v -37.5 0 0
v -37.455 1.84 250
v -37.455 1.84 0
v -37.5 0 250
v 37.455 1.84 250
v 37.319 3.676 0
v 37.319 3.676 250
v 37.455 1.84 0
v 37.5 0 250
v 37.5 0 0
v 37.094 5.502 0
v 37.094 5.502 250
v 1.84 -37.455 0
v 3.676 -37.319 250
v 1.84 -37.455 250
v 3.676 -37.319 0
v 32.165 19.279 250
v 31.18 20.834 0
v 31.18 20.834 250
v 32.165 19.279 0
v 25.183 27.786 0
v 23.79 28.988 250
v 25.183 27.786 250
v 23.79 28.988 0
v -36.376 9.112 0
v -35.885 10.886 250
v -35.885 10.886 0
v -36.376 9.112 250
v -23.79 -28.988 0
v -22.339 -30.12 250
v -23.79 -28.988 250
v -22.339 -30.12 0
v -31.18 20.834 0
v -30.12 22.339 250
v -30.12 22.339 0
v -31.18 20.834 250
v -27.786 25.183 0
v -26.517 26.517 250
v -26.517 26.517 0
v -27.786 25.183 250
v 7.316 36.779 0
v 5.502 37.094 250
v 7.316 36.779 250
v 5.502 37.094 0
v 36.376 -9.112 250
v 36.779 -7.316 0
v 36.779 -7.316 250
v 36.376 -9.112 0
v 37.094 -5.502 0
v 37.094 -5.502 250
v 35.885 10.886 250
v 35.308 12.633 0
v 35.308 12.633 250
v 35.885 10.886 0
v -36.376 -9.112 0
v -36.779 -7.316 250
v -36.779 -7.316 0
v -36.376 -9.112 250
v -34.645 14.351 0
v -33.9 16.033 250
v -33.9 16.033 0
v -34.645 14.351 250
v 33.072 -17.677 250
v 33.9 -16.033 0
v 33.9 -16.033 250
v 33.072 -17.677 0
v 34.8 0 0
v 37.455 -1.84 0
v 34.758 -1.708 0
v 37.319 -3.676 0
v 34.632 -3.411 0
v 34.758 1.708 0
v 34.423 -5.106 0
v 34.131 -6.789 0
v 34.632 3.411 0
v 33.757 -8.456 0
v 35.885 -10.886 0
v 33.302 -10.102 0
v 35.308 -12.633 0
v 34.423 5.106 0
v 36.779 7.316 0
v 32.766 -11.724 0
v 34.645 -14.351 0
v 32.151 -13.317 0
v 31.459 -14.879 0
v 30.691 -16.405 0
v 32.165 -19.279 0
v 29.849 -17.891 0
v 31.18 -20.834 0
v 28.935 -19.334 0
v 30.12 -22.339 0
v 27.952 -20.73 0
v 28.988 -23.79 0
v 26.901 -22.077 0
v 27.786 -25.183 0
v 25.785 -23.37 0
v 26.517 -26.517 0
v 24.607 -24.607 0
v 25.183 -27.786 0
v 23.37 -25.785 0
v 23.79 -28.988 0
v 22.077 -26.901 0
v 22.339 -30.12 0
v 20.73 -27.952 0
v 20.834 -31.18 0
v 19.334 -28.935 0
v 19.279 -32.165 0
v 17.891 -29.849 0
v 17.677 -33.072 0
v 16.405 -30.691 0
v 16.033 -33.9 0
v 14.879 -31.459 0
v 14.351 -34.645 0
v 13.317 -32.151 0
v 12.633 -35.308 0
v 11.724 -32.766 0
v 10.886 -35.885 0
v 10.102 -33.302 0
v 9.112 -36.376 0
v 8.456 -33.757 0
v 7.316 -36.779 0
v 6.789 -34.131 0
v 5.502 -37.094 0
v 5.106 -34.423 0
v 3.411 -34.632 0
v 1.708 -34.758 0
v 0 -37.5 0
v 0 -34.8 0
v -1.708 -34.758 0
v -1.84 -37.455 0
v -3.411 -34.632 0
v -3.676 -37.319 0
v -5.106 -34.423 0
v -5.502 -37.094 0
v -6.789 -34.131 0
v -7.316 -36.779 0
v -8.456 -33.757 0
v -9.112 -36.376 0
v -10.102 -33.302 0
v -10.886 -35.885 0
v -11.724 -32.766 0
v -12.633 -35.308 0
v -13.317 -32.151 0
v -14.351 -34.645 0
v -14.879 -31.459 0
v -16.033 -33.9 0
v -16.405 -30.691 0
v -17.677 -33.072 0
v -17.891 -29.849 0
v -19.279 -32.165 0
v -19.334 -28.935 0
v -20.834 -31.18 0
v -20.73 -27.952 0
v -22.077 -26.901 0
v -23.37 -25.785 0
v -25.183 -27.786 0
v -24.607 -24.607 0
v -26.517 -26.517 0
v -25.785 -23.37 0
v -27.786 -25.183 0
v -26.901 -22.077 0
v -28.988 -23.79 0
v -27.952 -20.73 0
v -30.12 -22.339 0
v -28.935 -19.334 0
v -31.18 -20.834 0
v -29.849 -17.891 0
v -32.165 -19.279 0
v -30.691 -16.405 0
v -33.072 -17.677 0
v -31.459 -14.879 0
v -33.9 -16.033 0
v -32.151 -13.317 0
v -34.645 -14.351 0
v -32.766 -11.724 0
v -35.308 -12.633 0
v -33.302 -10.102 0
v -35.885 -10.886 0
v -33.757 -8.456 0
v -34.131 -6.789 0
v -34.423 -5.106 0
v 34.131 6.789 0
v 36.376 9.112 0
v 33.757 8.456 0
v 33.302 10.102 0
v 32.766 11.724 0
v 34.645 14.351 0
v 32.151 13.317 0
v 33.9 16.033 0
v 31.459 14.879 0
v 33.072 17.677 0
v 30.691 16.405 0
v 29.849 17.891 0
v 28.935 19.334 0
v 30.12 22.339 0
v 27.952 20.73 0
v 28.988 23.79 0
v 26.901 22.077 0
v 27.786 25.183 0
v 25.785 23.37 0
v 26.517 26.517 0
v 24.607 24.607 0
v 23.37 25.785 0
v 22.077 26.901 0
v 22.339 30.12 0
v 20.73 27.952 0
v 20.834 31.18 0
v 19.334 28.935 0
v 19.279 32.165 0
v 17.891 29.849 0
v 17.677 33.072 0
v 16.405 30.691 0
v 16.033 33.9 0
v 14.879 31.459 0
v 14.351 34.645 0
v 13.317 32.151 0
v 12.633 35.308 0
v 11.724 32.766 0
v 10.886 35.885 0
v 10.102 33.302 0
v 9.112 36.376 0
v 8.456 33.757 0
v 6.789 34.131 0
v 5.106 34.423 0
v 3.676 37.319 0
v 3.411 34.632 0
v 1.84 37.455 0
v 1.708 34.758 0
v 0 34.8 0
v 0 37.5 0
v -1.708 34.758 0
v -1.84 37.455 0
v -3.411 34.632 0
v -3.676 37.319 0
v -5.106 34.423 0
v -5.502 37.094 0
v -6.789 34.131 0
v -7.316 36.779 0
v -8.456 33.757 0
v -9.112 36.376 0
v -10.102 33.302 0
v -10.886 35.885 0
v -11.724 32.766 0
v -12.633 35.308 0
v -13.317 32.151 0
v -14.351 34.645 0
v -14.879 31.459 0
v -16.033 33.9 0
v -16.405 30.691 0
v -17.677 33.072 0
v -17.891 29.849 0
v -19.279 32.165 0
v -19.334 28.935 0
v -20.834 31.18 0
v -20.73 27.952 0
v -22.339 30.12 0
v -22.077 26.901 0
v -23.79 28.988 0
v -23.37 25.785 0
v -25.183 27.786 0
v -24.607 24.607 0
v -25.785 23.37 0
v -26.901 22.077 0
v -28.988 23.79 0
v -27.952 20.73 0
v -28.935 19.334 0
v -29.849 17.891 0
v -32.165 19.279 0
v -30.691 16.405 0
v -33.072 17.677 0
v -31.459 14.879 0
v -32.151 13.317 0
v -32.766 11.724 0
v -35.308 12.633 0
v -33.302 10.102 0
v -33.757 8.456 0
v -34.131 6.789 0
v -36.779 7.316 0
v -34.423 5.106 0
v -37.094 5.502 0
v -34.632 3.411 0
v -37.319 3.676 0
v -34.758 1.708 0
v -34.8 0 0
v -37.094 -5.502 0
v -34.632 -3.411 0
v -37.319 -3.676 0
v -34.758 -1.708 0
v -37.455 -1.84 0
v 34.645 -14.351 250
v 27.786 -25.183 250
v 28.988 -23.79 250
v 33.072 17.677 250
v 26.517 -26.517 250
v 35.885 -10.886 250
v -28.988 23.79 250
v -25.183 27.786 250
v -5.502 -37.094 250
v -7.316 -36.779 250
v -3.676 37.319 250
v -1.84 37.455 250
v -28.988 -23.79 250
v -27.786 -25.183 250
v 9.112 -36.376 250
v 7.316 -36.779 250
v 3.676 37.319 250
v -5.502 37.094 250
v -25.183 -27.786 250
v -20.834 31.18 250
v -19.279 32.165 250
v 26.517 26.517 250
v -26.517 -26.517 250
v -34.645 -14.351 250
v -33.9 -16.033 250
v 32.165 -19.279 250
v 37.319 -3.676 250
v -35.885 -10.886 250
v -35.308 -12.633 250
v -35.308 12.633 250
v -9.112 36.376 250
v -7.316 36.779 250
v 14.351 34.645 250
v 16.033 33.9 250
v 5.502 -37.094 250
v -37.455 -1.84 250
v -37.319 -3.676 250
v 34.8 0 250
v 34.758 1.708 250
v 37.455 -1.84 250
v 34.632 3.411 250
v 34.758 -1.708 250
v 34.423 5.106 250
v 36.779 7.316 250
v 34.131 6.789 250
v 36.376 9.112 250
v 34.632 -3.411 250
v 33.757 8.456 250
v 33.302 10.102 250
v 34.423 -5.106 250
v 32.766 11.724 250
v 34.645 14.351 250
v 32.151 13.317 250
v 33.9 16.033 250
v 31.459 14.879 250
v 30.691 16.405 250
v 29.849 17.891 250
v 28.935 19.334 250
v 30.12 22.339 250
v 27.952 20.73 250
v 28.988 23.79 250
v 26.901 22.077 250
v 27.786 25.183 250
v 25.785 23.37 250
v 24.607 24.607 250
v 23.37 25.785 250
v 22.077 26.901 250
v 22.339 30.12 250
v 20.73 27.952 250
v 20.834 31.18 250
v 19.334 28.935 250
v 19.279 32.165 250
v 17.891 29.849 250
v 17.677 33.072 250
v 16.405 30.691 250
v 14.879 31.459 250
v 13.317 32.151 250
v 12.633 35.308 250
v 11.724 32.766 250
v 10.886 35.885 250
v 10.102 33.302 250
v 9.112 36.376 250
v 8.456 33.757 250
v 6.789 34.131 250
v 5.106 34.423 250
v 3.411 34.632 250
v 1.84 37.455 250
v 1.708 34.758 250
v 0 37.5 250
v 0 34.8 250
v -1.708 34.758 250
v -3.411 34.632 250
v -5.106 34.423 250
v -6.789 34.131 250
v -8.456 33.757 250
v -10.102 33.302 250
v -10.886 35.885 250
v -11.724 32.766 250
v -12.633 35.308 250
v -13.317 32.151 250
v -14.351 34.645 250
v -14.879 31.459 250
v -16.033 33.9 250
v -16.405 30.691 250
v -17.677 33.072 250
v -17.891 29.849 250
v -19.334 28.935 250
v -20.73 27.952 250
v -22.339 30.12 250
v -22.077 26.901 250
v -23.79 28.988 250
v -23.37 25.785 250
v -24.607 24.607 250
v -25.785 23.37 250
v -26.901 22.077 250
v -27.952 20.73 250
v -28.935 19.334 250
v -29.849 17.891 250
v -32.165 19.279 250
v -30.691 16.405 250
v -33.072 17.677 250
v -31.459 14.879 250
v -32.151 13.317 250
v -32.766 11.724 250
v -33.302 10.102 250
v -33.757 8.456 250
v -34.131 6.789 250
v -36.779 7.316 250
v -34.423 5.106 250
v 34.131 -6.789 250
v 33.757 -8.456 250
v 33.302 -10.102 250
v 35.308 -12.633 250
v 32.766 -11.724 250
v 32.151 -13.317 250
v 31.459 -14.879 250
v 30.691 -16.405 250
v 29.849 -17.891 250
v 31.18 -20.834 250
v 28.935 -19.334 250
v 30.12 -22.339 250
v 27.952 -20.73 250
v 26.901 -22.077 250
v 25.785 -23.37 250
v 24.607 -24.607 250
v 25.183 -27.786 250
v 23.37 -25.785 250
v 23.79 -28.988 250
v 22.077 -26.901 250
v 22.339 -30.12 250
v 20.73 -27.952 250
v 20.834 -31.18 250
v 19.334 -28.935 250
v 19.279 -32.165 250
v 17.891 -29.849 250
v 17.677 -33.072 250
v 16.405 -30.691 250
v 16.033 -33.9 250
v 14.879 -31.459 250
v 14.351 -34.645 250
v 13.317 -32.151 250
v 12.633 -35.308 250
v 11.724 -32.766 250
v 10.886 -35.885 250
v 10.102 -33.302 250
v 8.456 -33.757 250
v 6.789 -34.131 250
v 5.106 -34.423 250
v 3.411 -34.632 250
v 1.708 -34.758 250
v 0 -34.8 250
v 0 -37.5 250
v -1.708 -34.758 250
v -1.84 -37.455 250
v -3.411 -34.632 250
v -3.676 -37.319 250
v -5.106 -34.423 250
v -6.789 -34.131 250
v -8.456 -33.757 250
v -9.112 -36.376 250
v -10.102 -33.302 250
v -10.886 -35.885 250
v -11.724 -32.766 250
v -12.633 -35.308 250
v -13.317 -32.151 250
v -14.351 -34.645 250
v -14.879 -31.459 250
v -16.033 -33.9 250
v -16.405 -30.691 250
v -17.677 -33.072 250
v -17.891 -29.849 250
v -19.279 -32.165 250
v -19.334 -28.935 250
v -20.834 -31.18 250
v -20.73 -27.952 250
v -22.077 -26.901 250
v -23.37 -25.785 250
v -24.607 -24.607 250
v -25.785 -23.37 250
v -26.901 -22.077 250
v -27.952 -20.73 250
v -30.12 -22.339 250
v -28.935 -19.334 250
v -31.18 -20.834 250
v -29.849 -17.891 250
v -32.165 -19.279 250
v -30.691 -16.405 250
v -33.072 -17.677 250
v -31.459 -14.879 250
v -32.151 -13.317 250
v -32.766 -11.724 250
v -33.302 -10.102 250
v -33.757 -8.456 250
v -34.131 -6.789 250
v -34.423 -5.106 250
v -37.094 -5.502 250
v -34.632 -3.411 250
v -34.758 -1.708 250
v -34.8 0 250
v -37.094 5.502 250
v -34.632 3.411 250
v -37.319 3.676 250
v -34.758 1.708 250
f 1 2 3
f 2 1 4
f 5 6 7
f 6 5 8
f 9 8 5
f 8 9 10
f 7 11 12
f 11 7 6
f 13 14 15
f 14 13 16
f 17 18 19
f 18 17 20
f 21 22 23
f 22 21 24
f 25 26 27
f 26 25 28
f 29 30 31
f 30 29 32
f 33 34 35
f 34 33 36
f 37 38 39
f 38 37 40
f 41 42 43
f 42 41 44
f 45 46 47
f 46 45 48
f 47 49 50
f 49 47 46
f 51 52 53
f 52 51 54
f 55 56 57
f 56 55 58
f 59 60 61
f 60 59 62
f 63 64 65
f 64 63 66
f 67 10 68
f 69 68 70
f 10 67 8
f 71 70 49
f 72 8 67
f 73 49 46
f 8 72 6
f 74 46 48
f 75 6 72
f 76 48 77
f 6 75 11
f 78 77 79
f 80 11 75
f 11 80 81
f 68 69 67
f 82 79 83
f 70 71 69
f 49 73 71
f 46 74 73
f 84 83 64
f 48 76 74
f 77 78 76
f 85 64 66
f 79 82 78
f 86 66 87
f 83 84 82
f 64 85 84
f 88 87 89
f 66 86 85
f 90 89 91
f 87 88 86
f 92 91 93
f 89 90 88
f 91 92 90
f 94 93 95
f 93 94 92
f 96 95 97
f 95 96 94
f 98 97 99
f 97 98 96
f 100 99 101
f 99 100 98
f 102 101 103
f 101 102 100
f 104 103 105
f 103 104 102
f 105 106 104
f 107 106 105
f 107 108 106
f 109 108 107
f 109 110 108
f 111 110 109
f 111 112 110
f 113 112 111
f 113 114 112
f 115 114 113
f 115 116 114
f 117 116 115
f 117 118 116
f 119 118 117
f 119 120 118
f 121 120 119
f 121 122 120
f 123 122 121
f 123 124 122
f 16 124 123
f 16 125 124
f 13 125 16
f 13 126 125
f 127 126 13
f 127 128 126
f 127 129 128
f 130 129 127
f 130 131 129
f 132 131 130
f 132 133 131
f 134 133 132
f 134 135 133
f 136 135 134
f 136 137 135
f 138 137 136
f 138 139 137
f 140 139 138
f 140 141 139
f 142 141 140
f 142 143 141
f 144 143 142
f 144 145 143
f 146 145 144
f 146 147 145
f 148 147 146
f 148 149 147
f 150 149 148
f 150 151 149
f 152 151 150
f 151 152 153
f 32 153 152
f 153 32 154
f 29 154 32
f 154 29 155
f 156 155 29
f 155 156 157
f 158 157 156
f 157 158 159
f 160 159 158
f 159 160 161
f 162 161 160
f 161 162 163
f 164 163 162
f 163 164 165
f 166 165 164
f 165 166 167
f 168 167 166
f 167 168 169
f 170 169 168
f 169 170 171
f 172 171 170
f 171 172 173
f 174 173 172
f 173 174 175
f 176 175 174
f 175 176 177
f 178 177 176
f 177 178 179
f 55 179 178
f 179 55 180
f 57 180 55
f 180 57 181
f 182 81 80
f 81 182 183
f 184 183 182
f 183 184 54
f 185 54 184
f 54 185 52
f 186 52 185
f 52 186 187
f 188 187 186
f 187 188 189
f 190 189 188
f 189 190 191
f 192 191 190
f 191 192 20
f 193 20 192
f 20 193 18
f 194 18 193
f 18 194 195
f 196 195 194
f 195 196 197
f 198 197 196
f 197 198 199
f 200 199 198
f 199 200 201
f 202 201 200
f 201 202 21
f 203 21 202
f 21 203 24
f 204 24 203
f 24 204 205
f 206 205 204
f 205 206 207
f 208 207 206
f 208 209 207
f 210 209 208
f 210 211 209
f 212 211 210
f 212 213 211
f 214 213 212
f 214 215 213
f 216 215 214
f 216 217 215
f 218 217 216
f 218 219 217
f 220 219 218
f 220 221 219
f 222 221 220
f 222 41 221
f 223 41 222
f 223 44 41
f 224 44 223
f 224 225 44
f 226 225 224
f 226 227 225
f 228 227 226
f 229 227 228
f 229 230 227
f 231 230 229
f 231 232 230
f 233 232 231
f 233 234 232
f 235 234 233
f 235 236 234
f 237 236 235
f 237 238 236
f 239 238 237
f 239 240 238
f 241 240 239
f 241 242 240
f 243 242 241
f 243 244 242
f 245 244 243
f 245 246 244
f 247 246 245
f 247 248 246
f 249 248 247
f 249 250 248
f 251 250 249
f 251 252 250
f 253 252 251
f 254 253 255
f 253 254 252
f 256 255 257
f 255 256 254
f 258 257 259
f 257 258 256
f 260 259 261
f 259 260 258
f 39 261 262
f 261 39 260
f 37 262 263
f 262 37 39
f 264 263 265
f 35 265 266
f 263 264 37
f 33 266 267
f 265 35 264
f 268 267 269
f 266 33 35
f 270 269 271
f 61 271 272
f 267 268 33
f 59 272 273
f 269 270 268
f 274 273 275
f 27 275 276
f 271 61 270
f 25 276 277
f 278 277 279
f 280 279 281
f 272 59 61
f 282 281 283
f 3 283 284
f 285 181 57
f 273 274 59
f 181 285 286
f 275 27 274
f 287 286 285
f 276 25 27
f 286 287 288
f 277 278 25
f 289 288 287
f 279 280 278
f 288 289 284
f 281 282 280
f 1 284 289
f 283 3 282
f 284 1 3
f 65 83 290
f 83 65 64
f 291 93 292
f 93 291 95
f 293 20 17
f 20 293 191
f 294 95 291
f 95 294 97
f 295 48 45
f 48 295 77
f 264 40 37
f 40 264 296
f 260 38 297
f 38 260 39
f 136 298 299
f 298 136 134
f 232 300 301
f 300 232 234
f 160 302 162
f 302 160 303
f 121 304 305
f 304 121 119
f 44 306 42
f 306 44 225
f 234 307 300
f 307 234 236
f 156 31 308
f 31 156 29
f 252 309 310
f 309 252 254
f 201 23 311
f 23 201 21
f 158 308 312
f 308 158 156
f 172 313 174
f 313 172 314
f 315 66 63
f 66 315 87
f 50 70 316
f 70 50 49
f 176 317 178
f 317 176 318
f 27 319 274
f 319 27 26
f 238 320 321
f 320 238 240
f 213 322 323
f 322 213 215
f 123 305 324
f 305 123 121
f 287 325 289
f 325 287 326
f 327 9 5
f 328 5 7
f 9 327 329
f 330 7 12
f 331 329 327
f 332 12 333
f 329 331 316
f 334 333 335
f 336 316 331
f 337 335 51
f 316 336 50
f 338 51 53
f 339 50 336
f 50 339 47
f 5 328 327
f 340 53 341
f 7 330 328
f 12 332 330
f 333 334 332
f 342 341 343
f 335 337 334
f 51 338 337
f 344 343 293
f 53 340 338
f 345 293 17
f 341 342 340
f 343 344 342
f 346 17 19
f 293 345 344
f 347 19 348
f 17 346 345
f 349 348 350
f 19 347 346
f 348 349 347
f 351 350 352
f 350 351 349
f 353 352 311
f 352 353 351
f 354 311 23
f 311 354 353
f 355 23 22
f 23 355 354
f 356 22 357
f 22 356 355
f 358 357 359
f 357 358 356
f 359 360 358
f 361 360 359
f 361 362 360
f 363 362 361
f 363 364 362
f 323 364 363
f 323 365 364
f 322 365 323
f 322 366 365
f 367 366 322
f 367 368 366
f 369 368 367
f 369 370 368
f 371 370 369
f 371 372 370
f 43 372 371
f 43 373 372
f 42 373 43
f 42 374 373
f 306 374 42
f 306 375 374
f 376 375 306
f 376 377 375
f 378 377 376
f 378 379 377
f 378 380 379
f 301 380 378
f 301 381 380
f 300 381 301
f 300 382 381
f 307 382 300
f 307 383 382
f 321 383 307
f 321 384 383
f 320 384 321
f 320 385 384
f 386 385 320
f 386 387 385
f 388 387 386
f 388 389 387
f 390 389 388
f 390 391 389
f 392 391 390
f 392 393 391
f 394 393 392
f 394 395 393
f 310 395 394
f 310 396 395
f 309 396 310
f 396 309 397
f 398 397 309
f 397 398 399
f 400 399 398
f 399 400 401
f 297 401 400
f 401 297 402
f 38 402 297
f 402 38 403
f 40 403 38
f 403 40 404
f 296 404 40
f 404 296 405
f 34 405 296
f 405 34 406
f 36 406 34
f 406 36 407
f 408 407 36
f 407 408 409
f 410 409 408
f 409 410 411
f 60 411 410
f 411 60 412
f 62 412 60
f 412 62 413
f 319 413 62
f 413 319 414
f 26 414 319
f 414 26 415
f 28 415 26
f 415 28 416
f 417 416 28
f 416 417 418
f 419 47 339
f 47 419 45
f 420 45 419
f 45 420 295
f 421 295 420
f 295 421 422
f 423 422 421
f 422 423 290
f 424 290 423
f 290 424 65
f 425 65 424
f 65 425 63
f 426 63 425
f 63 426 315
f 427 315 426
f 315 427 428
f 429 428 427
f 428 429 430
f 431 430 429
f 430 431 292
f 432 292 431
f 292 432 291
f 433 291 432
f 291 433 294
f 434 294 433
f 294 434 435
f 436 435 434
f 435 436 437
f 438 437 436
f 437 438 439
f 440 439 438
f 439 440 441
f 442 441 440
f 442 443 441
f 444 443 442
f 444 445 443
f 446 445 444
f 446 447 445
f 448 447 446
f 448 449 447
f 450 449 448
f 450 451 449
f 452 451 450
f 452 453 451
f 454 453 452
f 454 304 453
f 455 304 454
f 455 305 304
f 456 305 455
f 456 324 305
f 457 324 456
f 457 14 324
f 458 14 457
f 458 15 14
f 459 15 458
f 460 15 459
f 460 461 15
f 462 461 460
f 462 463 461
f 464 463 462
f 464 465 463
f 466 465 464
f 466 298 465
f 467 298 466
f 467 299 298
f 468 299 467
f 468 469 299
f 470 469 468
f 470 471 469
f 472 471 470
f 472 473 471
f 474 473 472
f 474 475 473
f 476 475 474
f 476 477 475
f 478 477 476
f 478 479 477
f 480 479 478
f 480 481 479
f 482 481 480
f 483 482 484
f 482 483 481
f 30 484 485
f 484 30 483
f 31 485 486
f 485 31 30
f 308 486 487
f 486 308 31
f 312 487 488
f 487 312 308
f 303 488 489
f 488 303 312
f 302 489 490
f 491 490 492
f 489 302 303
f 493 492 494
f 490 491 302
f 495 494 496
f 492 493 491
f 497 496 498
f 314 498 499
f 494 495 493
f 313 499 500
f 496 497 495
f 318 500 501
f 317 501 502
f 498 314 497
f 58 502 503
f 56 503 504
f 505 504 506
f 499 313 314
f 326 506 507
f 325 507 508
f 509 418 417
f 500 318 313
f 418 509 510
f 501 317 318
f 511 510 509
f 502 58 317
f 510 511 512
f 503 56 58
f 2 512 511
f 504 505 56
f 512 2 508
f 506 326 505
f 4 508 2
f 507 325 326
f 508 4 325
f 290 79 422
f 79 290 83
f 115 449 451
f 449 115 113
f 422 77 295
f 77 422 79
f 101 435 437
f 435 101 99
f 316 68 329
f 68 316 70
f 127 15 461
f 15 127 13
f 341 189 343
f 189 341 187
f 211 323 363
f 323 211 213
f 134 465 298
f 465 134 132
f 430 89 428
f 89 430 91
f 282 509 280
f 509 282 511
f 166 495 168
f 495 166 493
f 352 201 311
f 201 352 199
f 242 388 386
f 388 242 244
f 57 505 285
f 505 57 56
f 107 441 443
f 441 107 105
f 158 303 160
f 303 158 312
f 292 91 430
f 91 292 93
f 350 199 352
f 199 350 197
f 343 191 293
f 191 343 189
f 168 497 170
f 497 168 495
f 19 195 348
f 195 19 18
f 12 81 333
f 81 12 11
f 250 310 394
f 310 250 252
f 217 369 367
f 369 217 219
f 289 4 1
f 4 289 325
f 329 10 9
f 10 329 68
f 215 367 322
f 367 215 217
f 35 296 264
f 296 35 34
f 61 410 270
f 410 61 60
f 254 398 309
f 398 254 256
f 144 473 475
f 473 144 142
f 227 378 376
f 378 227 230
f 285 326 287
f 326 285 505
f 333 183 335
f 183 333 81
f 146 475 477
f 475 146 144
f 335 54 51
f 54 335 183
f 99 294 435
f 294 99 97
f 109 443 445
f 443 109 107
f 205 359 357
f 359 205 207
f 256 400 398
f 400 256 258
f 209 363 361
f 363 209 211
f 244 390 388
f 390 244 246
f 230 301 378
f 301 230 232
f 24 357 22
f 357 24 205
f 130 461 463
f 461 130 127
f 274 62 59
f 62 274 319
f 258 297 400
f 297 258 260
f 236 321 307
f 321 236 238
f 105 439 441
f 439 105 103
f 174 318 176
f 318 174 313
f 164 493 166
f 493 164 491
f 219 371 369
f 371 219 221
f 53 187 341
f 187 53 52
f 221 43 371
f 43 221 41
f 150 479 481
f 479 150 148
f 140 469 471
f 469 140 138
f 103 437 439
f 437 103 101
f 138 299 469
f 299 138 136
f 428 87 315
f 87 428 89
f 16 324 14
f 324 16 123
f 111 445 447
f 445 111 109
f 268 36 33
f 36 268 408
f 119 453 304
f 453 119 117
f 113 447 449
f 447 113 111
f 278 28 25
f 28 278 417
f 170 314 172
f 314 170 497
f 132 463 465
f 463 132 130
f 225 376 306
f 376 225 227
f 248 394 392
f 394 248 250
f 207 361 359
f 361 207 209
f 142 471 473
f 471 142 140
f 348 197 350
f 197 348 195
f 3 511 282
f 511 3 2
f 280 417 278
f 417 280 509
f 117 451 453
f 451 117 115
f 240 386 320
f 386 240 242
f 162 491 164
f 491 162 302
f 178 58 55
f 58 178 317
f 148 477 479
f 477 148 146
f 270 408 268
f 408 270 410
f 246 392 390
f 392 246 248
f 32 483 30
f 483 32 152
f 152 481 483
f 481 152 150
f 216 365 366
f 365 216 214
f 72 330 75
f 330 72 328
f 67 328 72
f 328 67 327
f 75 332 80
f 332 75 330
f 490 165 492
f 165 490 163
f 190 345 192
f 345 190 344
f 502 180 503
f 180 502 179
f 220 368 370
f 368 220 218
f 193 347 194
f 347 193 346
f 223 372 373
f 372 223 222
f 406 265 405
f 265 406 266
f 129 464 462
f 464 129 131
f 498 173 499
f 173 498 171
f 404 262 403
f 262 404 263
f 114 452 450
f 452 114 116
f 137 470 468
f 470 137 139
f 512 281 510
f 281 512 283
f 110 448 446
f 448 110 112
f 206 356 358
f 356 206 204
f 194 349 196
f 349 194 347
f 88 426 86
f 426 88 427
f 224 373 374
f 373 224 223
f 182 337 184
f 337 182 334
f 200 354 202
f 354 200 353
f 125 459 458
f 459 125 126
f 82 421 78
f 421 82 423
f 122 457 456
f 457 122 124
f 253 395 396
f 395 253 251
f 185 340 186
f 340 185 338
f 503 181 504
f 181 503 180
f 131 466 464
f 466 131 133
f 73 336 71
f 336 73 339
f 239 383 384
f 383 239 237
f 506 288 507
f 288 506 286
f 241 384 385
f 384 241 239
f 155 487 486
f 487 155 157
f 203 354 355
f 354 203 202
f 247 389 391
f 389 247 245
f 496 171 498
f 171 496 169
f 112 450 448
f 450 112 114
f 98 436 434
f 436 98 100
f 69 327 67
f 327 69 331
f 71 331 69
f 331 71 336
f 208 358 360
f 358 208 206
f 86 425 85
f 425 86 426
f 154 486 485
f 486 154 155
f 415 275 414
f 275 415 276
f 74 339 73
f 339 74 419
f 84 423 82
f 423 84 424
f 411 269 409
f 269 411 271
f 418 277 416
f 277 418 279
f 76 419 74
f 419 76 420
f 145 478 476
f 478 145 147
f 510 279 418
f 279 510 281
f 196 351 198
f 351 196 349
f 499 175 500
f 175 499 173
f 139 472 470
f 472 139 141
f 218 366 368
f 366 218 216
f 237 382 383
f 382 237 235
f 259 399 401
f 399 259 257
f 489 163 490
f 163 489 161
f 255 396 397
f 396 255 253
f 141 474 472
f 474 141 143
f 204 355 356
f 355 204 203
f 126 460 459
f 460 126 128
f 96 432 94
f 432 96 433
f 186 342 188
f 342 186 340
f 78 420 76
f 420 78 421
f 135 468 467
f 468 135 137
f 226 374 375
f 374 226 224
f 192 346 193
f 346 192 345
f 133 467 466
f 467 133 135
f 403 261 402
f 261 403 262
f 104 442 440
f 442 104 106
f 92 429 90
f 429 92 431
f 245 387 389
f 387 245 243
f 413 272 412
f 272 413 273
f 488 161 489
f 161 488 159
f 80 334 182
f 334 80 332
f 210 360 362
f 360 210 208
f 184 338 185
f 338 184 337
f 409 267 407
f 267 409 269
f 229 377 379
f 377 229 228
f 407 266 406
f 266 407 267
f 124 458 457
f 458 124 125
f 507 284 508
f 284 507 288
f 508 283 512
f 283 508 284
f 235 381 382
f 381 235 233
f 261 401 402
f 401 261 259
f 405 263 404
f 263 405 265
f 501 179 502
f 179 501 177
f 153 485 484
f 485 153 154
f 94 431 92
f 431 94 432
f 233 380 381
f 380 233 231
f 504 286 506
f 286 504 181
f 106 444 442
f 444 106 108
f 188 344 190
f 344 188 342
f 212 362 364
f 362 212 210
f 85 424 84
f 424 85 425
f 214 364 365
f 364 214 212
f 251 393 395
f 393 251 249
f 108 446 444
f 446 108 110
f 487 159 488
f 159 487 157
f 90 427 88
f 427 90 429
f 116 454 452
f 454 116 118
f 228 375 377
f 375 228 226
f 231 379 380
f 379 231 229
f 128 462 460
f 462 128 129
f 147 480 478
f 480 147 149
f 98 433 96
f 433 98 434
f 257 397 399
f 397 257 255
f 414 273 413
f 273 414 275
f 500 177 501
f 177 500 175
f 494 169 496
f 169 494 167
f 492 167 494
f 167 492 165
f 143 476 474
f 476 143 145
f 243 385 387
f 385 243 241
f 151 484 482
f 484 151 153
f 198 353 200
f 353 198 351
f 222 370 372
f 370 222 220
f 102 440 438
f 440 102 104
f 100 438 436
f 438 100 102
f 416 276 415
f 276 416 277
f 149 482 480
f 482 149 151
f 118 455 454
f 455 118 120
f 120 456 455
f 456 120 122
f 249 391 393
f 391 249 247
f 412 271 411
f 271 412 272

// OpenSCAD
$fn = 128;

// HT pipe: DN75, length 250 mm (approximate dimensions)
// Typical HT DN75: OD ~ 75 mm, wall ~ 2.7 mm
// Adjust as needed for your specific standard/manufacturer.

od = 75;          // outer diameter (mm)
wall = 2.7;       // wall thickness (mm)
len = 250;        // length (mm)

id = od - 2*wall; // inner diameter (mm)

difference() {
  cylinder(h = len, d = od);
  translate([0,0,-0.5])
    cylinder(h = len + 1, d = id);
}
